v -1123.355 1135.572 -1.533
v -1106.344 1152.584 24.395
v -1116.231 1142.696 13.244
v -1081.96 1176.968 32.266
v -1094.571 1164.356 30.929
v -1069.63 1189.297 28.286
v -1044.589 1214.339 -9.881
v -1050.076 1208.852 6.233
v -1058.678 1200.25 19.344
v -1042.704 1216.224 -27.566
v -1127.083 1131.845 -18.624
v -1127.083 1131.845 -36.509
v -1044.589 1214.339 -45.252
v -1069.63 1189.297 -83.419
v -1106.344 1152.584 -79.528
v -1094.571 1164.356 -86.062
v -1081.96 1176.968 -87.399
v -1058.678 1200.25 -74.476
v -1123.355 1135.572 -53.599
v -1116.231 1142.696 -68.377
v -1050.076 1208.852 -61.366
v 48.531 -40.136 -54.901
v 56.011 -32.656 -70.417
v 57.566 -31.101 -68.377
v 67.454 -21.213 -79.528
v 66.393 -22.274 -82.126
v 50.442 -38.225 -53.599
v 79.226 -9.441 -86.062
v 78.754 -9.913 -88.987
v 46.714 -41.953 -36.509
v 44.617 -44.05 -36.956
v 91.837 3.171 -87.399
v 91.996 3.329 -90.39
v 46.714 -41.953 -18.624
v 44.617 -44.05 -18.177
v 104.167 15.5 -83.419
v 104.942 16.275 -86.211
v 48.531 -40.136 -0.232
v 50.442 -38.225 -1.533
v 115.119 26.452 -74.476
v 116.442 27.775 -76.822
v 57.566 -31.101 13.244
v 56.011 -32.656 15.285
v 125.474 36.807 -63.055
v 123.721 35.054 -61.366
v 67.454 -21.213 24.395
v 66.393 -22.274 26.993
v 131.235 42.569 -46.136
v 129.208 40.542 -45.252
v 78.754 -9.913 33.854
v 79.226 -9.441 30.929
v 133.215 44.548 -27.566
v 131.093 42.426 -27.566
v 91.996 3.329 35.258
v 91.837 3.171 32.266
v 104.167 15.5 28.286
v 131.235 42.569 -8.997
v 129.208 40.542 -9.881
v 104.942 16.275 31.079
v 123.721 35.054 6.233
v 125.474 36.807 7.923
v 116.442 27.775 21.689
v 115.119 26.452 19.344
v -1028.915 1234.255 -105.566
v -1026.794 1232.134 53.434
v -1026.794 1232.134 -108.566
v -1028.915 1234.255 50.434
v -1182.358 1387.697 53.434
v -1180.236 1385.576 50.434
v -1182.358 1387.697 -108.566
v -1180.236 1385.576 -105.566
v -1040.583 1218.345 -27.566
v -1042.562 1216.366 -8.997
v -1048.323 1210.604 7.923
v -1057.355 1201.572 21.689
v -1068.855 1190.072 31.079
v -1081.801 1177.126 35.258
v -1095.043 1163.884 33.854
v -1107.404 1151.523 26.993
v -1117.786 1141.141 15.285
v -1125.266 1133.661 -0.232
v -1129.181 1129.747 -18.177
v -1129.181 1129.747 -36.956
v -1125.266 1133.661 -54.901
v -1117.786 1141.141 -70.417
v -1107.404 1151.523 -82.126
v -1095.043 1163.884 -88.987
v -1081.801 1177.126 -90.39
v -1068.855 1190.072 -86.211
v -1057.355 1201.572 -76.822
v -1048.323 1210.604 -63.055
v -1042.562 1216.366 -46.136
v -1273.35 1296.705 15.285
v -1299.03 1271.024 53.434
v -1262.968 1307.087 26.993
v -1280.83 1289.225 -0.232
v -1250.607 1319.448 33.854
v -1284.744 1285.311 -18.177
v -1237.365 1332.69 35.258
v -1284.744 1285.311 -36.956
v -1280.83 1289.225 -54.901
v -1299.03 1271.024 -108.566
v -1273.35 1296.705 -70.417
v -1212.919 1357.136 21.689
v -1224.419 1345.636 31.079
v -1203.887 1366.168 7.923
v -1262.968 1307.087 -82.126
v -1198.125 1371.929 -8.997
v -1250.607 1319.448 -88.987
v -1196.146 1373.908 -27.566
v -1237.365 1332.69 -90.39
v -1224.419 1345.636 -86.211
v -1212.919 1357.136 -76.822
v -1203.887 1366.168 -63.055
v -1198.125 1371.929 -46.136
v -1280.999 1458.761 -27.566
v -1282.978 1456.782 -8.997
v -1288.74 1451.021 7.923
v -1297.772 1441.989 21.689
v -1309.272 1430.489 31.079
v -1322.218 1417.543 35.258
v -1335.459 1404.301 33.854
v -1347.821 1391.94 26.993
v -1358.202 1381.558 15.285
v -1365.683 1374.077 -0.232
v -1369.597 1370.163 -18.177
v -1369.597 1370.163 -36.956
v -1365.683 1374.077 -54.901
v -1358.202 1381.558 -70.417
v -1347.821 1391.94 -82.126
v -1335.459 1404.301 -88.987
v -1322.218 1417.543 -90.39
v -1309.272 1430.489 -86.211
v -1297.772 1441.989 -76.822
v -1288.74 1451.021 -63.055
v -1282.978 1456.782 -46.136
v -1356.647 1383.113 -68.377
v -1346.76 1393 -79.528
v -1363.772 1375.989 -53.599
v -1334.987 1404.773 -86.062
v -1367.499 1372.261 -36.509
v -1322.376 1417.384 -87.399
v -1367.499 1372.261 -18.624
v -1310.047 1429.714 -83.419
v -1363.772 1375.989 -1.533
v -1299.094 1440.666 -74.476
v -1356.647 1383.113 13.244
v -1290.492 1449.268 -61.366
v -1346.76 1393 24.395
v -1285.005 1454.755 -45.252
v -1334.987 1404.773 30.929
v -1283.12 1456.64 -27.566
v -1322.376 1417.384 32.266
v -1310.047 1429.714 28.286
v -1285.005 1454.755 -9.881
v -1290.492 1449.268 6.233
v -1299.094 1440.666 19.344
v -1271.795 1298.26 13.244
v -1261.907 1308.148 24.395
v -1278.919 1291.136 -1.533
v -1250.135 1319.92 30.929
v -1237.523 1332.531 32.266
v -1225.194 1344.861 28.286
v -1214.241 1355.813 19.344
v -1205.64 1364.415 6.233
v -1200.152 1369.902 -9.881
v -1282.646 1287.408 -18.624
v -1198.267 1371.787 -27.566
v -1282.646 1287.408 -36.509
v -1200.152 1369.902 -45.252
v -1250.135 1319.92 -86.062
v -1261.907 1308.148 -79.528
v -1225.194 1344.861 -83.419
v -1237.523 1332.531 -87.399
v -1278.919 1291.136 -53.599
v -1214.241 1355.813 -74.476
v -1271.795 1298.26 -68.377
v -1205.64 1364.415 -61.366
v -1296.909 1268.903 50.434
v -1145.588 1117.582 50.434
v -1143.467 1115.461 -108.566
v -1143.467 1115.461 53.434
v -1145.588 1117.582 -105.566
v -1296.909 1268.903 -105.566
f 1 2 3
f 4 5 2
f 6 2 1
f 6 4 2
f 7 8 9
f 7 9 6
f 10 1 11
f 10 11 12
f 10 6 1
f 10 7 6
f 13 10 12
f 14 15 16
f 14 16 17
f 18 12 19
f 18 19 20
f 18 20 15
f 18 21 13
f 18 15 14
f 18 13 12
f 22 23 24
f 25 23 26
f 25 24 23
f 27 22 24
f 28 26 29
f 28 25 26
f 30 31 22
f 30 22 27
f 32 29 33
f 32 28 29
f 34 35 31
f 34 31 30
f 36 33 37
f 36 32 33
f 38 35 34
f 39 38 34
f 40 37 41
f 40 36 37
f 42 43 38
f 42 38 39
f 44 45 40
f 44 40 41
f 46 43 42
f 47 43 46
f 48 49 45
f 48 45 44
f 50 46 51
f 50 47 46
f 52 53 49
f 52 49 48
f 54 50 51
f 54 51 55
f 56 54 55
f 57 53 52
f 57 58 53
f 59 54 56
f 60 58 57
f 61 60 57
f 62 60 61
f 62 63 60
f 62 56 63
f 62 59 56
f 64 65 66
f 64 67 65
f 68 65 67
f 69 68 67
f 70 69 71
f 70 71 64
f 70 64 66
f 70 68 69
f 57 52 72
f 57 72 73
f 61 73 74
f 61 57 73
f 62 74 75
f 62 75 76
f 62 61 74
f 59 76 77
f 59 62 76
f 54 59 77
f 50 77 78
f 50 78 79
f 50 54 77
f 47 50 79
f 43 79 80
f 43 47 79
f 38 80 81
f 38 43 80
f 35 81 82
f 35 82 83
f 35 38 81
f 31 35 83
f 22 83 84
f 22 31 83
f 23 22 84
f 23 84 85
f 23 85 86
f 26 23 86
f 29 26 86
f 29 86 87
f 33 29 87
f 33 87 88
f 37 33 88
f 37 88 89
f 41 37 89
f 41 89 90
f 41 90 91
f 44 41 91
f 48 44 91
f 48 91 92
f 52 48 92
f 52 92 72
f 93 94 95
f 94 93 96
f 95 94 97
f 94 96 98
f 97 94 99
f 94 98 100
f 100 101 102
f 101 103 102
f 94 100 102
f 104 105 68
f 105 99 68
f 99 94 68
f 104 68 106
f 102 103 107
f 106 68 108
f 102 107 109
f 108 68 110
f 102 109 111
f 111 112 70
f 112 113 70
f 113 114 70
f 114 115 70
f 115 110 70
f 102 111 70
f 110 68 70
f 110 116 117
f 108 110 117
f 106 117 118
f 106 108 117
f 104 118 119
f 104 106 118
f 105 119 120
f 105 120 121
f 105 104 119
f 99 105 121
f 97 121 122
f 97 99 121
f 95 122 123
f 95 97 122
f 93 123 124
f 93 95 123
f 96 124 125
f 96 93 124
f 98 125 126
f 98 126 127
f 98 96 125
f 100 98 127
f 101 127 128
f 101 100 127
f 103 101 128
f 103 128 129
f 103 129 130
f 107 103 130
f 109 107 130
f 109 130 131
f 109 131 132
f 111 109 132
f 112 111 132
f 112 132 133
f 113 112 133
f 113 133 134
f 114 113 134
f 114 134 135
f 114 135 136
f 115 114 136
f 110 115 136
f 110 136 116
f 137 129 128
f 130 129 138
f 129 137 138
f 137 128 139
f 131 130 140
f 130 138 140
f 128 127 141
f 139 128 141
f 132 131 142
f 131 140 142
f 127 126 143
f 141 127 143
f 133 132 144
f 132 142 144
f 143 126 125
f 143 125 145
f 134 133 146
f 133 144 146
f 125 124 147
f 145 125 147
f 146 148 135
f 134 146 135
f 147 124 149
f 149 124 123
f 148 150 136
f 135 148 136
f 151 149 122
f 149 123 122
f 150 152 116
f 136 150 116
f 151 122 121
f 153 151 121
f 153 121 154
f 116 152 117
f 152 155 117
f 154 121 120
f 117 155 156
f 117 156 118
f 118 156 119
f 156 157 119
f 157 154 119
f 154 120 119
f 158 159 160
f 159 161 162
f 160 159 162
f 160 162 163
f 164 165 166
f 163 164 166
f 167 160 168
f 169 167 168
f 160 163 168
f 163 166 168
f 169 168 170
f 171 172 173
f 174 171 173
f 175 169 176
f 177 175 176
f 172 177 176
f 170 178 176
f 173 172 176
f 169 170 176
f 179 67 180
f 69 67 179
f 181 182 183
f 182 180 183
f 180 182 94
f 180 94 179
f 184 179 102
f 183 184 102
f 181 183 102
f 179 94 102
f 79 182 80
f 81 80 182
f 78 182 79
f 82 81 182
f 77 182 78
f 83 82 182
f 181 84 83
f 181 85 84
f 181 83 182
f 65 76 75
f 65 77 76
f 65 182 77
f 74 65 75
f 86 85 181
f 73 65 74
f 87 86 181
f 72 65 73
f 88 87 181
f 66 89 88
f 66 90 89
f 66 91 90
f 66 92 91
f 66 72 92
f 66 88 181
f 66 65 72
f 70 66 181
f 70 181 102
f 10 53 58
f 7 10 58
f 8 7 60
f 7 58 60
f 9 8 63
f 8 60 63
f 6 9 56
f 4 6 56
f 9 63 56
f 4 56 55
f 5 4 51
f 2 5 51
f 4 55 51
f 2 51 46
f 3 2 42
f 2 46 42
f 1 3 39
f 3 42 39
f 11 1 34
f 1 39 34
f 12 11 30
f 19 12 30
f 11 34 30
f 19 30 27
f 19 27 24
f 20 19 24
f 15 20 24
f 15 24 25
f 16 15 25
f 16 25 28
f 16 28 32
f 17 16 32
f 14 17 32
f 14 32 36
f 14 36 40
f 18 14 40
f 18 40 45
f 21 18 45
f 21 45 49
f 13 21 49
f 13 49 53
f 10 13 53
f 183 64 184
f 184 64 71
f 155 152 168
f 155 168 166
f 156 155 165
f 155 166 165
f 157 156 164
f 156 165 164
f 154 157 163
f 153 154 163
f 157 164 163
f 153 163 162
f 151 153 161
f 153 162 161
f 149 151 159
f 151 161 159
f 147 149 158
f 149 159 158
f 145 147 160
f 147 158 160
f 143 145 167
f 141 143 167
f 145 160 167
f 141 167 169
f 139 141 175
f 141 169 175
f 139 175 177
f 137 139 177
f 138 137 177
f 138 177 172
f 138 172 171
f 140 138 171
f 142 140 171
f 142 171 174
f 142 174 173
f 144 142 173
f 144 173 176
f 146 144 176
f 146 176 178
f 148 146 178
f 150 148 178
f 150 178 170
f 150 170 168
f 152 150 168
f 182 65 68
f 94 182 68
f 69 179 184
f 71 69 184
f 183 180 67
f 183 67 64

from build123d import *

# Parameters (mm, degrees)
CROQUIS1_R              = 63
CROQUIS1_R_2            = 60
SALIENTE_EXTRUIR1_DEPTH = 2000
CROQUIS3_W              = 162
CROQUIS3_H              = 220
SALIENTE_EXTRUIR2_DEPTH = 82.5
CROQUIS5_W              = 156
CROQUIS5_H              = 214
CORTAR_EXTRUIR1_DEPTH   = 165


with BuildPart() as part:
    # Croquis1 → Saliente-Extruir1 (new body)
    with BuildSketch(Plane(origin=(44.333451415, -44.333451415, 0), x_dir=(0, 0, -1), z_dir=(0.7071067811865438, -0.7071067811865512, 0))):
        with Locations((27.566313026, 62.696968258)):
            Circle(CROQUIS1_R)
        with Locations((27.566313026, 62.696968258)):
            Circle(CROQUIS1_R_2, mode=Mode.SUBTRACT)
    extrude(amount=-SALIENTE_EXTRUIR1_DEPTH)

    # Croquis3 → Saliente-Extruir2 (add, symmetric)
    with BuildSketch(Plane(origin=(44.333451415, 44.333451415, 0), x_dir=(0, 0, -1), z_dir=(0.7071067811865488, 0.7071067811865464, 0))):
        with Locations((27.566313026, 1707.303031742)):
            Rectangle(CROQUIS3_W, CROQUIS3_H)
    extrude(amount=SALIENTE_EXTRUIR2_DEPTH, both=True)

    # Croquis5 → Cortar-Extruir1 (cut)
    with BuildSketch(Plane(origin=(102.669760863, 102.669760863, 0), x_dir=(0, 0, -1), z_dir=(0.7071067811865485, 0.7071067811865467, 0))):
        with Locations((27.566313026, 1707.303031742)):
            Rectangle(CROQUIS5_W, CROQUIS5_H)
    extrude(amount=-CORTAR_EXTRUIR1_DEPTH, mode=Mode.SUBTRACT)


solid = part.part
